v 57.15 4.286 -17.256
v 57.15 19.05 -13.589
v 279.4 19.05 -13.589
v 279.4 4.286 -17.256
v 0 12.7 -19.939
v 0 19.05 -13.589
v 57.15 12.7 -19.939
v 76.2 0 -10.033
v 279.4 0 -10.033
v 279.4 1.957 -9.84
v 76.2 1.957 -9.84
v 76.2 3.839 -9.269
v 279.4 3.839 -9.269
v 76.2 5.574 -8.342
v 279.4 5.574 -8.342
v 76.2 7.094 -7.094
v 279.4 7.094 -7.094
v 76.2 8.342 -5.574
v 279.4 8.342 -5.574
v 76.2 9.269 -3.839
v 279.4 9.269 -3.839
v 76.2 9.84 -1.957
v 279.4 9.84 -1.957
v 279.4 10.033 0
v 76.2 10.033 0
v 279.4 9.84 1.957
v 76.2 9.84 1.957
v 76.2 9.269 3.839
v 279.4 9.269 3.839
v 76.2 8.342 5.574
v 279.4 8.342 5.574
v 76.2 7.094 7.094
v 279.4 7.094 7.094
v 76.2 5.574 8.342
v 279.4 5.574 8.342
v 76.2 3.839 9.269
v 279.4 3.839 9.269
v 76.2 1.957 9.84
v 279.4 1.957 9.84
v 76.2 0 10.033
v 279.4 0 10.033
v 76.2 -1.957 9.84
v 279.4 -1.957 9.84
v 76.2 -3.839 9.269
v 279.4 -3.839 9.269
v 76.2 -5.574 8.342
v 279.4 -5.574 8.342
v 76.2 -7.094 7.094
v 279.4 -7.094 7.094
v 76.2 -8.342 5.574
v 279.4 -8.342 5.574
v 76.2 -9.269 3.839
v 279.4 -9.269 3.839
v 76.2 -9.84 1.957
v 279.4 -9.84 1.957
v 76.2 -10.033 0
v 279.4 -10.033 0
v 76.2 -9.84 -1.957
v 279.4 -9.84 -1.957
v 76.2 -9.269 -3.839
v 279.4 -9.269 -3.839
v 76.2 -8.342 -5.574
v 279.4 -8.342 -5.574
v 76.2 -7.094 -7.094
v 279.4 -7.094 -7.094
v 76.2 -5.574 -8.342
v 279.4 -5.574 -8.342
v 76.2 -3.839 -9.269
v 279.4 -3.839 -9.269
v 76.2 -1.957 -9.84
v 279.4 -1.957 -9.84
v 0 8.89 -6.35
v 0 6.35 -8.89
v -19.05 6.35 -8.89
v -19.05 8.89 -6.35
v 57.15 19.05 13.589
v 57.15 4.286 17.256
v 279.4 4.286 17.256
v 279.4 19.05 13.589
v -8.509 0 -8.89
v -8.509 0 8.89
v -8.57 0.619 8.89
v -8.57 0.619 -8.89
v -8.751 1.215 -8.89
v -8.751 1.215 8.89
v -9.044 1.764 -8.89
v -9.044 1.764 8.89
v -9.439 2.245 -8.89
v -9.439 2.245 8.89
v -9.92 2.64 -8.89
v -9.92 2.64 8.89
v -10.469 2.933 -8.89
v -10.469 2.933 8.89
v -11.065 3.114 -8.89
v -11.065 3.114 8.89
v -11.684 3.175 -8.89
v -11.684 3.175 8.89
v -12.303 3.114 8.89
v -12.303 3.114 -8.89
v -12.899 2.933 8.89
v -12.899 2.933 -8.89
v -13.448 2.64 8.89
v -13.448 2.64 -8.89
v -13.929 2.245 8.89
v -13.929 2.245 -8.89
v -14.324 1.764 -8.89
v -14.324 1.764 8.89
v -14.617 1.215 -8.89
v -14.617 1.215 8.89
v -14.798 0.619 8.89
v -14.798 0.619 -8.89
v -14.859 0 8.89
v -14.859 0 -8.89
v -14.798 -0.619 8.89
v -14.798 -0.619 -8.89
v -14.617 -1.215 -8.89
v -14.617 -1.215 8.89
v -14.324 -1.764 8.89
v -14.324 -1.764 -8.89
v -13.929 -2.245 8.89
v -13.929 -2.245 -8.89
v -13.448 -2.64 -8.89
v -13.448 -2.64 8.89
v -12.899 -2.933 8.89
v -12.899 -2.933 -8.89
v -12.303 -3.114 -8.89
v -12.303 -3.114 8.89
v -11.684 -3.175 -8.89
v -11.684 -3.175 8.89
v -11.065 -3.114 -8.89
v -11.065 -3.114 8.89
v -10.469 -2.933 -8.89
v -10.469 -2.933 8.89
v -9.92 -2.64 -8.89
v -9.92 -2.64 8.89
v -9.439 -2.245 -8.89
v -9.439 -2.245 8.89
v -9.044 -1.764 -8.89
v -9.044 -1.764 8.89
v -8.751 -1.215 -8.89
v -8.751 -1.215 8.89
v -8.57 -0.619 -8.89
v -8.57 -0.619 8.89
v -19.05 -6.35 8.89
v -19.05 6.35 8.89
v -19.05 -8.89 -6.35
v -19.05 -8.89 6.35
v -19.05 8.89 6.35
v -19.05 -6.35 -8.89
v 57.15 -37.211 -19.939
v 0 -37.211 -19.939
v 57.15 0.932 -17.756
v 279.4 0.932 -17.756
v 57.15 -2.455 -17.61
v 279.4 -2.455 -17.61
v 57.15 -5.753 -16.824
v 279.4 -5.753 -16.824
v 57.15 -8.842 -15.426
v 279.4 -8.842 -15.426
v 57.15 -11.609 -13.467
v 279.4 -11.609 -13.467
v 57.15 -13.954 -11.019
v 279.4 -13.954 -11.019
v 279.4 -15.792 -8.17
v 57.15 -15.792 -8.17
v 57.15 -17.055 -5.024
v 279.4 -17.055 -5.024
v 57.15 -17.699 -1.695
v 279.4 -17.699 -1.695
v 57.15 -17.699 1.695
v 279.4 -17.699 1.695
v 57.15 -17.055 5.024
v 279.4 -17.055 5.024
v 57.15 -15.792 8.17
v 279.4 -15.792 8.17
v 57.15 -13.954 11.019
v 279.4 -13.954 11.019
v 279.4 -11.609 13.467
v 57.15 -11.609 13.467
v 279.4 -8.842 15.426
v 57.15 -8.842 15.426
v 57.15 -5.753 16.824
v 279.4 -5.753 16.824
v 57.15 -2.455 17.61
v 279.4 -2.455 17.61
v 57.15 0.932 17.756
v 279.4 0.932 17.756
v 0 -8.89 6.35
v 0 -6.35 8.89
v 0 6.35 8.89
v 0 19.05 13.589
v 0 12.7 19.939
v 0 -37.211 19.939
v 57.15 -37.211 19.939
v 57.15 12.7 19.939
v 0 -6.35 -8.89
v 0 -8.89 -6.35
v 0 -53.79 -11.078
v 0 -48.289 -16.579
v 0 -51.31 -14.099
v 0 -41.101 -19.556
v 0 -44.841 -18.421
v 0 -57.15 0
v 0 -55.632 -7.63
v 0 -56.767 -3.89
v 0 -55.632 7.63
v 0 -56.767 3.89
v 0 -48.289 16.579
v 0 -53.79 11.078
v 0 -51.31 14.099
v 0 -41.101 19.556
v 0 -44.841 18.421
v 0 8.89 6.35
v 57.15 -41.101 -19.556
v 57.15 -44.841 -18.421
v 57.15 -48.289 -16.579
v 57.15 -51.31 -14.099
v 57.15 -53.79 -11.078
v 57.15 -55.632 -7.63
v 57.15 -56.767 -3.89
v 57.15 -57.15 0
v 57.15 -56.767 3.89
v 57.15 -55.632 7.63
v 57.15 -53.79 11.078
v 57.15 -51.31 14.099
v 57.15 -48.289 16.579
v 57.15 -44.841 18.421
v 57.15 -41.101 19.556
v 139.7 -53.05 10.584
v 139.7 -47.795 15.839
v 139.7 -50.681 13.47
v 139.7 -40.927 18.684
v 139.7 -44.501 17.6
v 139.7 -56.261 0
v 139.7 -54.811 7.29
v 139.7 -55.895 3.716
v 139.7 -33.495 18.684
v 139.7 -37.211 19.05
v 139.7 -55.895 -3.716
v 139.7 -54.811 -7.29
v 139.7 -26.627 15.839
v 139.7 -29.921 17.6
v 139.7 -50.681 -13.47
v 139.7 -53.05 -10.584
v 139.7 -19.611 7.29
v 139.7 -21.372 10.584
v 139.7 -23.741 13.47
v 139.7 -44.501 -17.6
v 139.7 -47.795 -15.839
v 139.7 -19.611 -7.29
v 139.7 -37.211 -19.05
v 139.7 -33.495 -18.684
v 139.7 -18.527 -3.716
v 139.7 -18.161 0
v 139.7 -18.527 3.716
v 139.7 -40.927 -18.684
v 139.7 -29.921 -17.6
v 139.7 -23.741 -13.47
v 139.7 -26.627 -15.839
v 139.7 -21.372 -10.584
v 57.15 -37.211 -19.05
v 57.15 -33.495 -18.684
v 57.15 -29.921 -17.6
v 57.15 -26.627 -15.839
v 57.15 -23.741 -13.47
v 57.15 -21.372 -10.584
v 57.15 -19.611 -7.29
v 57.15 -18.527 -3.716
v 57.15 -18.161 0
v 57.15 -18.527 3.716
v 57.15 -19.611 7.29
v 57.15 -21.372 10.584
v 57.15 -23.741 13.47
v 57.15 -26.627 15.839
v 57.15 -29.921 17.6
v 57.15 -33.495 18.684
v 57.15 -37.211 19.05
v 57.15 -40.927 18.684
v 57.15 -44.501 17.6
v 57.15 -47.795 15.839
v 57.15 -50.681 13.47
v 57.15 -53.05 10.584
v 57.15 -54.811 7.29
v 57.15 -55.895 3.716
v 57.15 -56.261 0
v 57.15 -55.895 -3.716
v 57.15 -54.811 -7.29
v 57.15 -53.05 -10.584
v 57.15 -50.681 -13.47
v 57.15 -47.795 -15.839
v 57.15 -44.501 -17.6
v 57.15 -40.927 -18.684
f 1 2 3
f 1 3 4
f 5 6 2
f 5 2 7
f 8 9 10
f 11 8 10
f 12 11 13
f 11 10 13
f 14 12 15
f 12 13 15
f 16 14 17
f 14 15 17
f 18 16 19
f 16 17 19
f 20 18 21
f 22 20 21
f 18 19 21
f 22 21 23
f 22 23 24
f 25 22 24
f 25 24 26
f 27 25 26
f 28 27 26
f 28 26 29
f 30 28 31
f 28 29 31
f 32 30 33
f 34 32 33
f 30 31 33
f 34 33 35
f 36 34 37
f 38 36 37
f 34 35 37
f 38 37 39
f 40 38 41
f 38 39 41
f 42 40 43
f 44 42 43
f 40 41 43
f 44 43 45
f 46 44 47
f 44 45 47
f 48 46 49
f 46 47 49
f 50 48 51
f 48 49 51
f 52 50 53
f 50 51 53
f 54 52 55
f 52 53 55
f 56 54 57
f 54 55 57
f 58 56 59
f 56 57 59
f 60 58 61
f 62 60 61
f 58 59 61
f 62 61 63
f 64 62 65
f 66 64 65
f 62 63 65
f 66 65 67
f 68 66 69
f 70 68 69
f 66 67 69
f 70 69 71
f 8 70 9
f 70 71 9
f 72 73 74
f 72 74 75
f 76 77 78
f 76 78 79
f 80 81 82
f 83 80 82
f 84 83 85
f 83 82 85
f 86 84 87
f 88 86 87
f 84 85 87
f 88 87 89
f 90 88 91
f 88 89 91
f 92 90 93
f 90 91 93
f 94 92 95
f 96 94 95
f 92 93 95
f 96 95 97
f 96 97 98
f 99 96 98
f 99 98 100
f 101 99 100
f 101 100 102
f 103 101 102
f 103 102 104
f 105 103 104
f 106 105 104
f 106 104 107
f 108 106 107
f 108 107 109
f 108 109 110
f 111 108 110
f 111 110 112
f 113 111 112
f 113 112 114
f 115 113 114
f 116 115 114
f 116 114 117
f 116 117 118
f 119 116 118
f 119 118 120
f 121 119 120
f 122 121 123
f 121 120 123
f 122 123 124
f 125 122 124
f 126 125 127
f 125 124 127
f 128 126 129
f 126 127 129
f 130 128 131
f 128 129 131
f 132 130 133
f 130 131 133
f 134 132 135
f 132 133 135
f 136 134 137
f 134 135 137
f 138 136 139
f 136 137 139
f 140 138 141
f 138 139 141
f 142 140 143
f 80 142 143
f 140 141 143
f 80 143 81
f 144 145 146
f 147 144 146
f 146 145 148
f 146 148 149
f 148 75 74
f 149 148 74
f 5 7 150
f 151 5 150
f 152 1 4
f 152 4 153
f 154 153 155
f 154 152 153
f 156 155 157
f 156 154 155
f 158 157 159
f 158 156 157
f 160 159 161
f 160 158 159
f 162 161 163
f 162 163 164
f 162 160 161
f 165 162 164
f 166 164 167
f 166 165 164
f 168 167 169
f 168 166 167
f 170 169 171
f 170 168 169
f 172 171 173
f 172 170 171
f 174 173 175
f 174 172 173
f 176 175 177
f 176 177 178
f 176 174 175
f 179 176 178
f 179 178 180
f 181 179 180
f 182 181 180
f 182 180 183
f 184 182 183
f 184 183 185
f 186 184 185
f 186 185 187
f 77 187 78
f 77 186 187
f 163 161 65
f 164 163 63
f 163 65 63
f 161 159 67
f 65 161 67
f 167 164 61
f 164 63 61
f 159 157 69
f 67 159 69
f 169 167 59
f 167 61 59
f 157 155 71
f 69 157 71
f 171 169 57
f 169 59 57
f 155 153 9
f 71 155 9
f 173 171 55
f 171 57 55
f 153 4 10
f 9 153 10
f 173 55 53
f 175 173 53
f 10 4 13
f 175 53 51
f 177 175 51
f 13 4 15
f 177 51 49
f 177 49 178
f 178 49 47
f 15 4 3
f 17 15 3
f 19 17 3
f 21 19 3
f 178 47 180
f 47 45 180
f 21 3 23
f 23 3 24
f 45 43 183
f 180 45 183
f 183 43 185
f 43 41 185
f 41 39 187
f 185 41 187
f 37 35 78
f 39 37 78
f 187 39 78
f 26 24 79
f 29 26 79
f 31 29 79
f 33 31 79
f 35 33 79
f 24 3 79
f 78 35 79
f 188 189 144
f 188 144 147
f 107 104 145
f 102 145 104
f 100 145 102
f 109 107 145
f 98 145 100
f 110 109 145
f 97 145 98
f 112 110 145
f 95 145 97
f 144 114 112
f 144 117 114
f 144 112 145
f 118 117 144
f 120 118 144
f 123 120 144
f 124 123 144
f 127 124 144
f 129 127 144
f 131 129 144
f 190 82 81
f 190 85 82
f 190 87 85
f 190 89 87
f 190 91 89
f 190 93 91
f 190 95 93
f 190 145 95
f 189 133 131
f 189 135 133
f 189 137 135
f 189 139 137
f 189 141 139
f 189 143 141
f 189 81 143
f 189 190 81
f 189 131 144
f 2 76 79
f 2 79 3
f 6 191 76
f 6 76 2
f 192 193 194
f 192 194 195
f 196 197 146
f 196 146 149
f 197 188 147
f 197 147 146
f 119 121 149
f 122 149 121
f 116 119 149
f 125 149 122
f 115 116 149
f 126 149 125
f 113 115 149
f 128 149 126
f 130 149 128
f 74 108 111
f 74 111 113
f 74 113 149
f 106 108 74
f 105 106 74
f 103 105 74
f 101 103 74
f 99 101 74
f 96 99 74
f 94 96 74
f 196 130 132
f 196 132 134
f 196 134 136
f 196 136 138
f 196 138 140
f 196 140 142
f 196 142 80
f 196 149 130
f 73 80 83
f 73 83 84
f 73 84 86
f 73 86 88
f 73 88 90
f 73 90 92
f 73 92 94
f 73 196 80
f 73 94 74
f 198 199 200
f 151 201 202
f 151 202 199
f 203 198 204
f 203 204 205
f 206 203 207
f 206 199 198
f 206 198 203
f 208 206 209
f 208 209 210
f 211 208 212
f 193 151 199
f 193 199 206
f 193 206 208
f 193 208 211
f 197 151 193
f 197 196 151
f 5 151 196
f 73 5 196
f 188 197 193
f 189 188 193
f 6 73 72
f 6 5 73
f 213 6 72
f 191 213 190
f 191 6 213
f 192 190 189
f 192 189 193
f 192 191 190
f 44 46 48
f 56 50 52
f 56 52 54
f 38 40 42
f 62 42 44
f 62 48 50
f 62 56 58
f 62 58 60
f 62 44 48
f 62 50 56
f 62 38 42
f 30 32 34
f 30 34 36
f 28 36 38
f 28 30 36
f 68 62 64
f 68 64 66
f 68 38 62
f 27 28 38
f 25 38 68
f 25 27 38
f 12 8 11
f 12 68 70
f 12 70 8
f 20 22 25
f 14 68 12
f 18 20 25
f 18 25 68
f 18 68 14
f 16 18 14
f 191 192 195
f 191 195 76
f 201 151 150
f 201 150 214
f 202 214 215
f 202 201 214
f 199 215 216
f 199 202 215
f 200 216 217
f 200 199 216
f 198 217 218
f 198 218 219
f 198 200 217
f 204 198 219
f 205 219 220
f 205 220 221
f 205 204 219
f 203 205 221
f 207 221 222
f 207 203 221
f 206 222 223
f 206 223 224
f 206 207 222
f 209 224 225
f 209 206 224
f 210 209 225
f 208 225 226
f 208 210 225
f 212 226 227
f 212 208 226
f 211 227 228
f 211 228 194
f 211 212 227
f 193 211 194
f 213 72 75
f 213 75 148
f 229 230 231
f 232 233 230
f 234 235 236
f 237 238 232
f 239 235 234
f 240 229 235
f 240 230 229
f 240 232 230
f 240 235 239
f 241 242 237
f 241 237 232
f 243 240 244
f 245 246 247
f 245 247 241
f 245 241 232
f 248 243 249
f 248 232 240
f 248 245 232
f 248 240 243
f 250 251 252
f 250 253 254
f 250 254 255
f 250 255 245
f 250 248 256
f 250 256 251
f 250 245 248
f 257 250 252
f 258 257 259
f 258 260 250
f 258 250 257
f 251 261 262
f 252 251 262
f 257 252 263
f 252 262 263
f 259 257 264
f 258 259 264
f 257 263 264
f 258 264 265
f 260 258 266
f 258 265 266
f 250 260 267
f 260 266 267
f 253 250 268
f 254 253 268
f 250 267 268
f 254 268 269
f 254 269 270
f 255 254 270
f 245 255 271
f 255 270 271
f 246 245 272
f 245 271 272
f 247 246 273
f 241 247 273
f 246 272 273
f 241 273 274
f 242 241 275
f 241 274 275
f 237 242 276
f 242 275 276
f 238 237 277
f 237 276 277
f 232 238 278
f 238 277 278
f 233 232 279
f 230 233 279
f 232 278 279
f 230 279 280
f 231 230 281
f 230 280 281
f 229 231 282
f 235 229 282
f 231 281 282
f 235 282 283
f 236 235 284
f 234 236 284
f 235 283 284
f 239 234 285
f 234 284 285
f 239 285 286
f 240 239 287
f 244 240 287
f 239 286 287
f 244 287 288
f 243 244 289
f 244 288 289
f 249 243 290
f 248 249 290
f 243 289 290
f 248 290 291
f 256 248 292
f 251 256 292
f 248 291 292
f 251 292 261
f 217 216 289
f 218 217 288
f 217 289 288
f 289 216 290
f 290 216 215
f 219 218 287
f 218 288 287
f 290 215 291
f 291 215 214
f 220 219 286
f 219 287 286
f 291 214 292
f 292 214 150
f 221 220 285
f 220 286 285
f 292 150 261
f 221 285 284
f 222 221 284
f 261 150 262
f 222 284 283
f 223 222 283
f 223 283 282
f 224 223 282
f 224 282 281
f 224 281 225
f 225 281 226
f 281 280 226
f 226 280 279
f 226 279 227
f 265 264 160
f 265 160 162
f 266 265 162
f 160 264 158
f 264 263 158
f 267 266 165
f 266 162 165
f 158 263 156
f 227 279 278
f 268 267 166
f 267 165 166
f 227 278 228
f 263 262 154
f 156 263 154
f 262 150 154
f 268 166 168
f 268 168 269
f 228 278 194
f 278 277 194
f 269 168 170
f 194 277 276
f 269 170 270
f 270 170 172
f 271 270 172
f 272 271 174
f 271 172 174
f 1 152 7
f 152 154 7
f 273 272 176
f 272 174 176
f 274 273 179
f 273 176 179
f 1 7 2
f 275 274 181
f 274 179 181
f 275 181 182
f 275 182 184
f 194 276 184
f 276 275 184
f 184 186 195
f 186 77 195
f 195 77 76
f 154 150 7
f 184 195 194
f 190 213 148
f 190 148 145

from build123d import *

# Parameters (mm, degrees)
BOSS_EXTRUDE1_DEPTH = 57.15
SKETCH2_R           = 19.05
BOSS_EXTRUDE2_DEPTH = 82.55
BOSS_EXTRUDE3_DEPTH = 19.05
SKETCH4_R           = 3.175
CUT_EXTRUDE1_DEPTH  = 154.666273922
BOSS_EXTRUDE4_DEPTH = 222.25
SKETCH6_R           = 10.033
CUT_EXTRUDE2_DEPTH  = 203.2


with BuildPart() as part:
    # Sketch1 → Boss-Extrude1 (new body)
    with BuildSketch(Plane(origin=(0, 0, 0), x_dir=(0, 0, -1), z_dir=(1, 0, 0))):
        with BuildLine():
            Line((-13.589, 19.05), (13.589, 19.05))
            Line((13.589, 19.05), (19.939, 12.7))
            Line((19.939, 12.7), (19.939, -37.211))
            ThreePointArc((19.939, -37.211), (0, -57.15), (-19.939, -37.211))
            Line((-19.939, -37.211), (-19.939, 12.7))
            Line((-19.939, 12.7), (-13.589, 19.05))
        make_face()
    extrude(amount=BOSS_EXTRUDE1_DEPTH)

    # Sketch2 → Boss-Extrude2 (add)
    with BuildSketch(Plane(origin=(57.15, 0, 0), x_dir=(0, 0, -1), z_dir=(1, 0, 0))):
        with Locations((0, -37.211)):
            Circle(SKETCH2_R)
    extrude(amount=BOSS_EXTRUDE2_DEPTH)

    # Sketch3 → Boss-Extrude3 (add)
    with BuildSketch(Plane.ZY):
        Polygon((-6.35, 8.89), (6.35, 8.89), (8.89, 6.35), (8.89, -6.35), (6.35, -8.89), (-6.35, -8.89), (-8.89, -6.35), (-8.89, 6.35), align=None)
    extrude(amount=BOSS_EXTRUDE3_DEPTH)

    # Sketch4 → Cut-Extrude1 (cut, through all)
    with BuildSketch(Plane.XY.offset(8.89)):
        with Locations((-11.684, 0)):
            Circle(SKETCH4_R)
    extrude(amount=-CUT_EXTRUDE1_DEPTH, mode=Mode.SUBTRACT)

    # Sketch5 → Boss-Extrude4 (add)
    with BuildSketch(Plane(origin=(57.15, 0, 0), x_dir=(0, 0, -1), z_dir=(1, 0, 0))):
        with BuildLine():
            Line((-13.589, 19.05), (13.589, 19.05))
            Line((13.589, 19.05), (17.255800165, 4.285529215))
            ThreePointArc((17.255800165, 4.285529215), (0, -17.78), (-17.255800165, 4.285529215))
            Line((-17.255800165, 4.285529215), (-13.589, 19.05))
        make_face()
    extrude(amount=BOSS_EXTRUDE4_DEPTH)

    # Sketch6 → Cut-Extrude2 (cut)
    with BuildSketch(Plane(origin=(279.4, 0, 0), x_dir=(0, 0, -1), z_dir=(1, 0, 0))):
        Circle(SKETCH6_R)
    extrude(amount=-CUT_EXTRUDE2_DEPTH, mode=Mode.SUBTRACT)


solid = part.part
